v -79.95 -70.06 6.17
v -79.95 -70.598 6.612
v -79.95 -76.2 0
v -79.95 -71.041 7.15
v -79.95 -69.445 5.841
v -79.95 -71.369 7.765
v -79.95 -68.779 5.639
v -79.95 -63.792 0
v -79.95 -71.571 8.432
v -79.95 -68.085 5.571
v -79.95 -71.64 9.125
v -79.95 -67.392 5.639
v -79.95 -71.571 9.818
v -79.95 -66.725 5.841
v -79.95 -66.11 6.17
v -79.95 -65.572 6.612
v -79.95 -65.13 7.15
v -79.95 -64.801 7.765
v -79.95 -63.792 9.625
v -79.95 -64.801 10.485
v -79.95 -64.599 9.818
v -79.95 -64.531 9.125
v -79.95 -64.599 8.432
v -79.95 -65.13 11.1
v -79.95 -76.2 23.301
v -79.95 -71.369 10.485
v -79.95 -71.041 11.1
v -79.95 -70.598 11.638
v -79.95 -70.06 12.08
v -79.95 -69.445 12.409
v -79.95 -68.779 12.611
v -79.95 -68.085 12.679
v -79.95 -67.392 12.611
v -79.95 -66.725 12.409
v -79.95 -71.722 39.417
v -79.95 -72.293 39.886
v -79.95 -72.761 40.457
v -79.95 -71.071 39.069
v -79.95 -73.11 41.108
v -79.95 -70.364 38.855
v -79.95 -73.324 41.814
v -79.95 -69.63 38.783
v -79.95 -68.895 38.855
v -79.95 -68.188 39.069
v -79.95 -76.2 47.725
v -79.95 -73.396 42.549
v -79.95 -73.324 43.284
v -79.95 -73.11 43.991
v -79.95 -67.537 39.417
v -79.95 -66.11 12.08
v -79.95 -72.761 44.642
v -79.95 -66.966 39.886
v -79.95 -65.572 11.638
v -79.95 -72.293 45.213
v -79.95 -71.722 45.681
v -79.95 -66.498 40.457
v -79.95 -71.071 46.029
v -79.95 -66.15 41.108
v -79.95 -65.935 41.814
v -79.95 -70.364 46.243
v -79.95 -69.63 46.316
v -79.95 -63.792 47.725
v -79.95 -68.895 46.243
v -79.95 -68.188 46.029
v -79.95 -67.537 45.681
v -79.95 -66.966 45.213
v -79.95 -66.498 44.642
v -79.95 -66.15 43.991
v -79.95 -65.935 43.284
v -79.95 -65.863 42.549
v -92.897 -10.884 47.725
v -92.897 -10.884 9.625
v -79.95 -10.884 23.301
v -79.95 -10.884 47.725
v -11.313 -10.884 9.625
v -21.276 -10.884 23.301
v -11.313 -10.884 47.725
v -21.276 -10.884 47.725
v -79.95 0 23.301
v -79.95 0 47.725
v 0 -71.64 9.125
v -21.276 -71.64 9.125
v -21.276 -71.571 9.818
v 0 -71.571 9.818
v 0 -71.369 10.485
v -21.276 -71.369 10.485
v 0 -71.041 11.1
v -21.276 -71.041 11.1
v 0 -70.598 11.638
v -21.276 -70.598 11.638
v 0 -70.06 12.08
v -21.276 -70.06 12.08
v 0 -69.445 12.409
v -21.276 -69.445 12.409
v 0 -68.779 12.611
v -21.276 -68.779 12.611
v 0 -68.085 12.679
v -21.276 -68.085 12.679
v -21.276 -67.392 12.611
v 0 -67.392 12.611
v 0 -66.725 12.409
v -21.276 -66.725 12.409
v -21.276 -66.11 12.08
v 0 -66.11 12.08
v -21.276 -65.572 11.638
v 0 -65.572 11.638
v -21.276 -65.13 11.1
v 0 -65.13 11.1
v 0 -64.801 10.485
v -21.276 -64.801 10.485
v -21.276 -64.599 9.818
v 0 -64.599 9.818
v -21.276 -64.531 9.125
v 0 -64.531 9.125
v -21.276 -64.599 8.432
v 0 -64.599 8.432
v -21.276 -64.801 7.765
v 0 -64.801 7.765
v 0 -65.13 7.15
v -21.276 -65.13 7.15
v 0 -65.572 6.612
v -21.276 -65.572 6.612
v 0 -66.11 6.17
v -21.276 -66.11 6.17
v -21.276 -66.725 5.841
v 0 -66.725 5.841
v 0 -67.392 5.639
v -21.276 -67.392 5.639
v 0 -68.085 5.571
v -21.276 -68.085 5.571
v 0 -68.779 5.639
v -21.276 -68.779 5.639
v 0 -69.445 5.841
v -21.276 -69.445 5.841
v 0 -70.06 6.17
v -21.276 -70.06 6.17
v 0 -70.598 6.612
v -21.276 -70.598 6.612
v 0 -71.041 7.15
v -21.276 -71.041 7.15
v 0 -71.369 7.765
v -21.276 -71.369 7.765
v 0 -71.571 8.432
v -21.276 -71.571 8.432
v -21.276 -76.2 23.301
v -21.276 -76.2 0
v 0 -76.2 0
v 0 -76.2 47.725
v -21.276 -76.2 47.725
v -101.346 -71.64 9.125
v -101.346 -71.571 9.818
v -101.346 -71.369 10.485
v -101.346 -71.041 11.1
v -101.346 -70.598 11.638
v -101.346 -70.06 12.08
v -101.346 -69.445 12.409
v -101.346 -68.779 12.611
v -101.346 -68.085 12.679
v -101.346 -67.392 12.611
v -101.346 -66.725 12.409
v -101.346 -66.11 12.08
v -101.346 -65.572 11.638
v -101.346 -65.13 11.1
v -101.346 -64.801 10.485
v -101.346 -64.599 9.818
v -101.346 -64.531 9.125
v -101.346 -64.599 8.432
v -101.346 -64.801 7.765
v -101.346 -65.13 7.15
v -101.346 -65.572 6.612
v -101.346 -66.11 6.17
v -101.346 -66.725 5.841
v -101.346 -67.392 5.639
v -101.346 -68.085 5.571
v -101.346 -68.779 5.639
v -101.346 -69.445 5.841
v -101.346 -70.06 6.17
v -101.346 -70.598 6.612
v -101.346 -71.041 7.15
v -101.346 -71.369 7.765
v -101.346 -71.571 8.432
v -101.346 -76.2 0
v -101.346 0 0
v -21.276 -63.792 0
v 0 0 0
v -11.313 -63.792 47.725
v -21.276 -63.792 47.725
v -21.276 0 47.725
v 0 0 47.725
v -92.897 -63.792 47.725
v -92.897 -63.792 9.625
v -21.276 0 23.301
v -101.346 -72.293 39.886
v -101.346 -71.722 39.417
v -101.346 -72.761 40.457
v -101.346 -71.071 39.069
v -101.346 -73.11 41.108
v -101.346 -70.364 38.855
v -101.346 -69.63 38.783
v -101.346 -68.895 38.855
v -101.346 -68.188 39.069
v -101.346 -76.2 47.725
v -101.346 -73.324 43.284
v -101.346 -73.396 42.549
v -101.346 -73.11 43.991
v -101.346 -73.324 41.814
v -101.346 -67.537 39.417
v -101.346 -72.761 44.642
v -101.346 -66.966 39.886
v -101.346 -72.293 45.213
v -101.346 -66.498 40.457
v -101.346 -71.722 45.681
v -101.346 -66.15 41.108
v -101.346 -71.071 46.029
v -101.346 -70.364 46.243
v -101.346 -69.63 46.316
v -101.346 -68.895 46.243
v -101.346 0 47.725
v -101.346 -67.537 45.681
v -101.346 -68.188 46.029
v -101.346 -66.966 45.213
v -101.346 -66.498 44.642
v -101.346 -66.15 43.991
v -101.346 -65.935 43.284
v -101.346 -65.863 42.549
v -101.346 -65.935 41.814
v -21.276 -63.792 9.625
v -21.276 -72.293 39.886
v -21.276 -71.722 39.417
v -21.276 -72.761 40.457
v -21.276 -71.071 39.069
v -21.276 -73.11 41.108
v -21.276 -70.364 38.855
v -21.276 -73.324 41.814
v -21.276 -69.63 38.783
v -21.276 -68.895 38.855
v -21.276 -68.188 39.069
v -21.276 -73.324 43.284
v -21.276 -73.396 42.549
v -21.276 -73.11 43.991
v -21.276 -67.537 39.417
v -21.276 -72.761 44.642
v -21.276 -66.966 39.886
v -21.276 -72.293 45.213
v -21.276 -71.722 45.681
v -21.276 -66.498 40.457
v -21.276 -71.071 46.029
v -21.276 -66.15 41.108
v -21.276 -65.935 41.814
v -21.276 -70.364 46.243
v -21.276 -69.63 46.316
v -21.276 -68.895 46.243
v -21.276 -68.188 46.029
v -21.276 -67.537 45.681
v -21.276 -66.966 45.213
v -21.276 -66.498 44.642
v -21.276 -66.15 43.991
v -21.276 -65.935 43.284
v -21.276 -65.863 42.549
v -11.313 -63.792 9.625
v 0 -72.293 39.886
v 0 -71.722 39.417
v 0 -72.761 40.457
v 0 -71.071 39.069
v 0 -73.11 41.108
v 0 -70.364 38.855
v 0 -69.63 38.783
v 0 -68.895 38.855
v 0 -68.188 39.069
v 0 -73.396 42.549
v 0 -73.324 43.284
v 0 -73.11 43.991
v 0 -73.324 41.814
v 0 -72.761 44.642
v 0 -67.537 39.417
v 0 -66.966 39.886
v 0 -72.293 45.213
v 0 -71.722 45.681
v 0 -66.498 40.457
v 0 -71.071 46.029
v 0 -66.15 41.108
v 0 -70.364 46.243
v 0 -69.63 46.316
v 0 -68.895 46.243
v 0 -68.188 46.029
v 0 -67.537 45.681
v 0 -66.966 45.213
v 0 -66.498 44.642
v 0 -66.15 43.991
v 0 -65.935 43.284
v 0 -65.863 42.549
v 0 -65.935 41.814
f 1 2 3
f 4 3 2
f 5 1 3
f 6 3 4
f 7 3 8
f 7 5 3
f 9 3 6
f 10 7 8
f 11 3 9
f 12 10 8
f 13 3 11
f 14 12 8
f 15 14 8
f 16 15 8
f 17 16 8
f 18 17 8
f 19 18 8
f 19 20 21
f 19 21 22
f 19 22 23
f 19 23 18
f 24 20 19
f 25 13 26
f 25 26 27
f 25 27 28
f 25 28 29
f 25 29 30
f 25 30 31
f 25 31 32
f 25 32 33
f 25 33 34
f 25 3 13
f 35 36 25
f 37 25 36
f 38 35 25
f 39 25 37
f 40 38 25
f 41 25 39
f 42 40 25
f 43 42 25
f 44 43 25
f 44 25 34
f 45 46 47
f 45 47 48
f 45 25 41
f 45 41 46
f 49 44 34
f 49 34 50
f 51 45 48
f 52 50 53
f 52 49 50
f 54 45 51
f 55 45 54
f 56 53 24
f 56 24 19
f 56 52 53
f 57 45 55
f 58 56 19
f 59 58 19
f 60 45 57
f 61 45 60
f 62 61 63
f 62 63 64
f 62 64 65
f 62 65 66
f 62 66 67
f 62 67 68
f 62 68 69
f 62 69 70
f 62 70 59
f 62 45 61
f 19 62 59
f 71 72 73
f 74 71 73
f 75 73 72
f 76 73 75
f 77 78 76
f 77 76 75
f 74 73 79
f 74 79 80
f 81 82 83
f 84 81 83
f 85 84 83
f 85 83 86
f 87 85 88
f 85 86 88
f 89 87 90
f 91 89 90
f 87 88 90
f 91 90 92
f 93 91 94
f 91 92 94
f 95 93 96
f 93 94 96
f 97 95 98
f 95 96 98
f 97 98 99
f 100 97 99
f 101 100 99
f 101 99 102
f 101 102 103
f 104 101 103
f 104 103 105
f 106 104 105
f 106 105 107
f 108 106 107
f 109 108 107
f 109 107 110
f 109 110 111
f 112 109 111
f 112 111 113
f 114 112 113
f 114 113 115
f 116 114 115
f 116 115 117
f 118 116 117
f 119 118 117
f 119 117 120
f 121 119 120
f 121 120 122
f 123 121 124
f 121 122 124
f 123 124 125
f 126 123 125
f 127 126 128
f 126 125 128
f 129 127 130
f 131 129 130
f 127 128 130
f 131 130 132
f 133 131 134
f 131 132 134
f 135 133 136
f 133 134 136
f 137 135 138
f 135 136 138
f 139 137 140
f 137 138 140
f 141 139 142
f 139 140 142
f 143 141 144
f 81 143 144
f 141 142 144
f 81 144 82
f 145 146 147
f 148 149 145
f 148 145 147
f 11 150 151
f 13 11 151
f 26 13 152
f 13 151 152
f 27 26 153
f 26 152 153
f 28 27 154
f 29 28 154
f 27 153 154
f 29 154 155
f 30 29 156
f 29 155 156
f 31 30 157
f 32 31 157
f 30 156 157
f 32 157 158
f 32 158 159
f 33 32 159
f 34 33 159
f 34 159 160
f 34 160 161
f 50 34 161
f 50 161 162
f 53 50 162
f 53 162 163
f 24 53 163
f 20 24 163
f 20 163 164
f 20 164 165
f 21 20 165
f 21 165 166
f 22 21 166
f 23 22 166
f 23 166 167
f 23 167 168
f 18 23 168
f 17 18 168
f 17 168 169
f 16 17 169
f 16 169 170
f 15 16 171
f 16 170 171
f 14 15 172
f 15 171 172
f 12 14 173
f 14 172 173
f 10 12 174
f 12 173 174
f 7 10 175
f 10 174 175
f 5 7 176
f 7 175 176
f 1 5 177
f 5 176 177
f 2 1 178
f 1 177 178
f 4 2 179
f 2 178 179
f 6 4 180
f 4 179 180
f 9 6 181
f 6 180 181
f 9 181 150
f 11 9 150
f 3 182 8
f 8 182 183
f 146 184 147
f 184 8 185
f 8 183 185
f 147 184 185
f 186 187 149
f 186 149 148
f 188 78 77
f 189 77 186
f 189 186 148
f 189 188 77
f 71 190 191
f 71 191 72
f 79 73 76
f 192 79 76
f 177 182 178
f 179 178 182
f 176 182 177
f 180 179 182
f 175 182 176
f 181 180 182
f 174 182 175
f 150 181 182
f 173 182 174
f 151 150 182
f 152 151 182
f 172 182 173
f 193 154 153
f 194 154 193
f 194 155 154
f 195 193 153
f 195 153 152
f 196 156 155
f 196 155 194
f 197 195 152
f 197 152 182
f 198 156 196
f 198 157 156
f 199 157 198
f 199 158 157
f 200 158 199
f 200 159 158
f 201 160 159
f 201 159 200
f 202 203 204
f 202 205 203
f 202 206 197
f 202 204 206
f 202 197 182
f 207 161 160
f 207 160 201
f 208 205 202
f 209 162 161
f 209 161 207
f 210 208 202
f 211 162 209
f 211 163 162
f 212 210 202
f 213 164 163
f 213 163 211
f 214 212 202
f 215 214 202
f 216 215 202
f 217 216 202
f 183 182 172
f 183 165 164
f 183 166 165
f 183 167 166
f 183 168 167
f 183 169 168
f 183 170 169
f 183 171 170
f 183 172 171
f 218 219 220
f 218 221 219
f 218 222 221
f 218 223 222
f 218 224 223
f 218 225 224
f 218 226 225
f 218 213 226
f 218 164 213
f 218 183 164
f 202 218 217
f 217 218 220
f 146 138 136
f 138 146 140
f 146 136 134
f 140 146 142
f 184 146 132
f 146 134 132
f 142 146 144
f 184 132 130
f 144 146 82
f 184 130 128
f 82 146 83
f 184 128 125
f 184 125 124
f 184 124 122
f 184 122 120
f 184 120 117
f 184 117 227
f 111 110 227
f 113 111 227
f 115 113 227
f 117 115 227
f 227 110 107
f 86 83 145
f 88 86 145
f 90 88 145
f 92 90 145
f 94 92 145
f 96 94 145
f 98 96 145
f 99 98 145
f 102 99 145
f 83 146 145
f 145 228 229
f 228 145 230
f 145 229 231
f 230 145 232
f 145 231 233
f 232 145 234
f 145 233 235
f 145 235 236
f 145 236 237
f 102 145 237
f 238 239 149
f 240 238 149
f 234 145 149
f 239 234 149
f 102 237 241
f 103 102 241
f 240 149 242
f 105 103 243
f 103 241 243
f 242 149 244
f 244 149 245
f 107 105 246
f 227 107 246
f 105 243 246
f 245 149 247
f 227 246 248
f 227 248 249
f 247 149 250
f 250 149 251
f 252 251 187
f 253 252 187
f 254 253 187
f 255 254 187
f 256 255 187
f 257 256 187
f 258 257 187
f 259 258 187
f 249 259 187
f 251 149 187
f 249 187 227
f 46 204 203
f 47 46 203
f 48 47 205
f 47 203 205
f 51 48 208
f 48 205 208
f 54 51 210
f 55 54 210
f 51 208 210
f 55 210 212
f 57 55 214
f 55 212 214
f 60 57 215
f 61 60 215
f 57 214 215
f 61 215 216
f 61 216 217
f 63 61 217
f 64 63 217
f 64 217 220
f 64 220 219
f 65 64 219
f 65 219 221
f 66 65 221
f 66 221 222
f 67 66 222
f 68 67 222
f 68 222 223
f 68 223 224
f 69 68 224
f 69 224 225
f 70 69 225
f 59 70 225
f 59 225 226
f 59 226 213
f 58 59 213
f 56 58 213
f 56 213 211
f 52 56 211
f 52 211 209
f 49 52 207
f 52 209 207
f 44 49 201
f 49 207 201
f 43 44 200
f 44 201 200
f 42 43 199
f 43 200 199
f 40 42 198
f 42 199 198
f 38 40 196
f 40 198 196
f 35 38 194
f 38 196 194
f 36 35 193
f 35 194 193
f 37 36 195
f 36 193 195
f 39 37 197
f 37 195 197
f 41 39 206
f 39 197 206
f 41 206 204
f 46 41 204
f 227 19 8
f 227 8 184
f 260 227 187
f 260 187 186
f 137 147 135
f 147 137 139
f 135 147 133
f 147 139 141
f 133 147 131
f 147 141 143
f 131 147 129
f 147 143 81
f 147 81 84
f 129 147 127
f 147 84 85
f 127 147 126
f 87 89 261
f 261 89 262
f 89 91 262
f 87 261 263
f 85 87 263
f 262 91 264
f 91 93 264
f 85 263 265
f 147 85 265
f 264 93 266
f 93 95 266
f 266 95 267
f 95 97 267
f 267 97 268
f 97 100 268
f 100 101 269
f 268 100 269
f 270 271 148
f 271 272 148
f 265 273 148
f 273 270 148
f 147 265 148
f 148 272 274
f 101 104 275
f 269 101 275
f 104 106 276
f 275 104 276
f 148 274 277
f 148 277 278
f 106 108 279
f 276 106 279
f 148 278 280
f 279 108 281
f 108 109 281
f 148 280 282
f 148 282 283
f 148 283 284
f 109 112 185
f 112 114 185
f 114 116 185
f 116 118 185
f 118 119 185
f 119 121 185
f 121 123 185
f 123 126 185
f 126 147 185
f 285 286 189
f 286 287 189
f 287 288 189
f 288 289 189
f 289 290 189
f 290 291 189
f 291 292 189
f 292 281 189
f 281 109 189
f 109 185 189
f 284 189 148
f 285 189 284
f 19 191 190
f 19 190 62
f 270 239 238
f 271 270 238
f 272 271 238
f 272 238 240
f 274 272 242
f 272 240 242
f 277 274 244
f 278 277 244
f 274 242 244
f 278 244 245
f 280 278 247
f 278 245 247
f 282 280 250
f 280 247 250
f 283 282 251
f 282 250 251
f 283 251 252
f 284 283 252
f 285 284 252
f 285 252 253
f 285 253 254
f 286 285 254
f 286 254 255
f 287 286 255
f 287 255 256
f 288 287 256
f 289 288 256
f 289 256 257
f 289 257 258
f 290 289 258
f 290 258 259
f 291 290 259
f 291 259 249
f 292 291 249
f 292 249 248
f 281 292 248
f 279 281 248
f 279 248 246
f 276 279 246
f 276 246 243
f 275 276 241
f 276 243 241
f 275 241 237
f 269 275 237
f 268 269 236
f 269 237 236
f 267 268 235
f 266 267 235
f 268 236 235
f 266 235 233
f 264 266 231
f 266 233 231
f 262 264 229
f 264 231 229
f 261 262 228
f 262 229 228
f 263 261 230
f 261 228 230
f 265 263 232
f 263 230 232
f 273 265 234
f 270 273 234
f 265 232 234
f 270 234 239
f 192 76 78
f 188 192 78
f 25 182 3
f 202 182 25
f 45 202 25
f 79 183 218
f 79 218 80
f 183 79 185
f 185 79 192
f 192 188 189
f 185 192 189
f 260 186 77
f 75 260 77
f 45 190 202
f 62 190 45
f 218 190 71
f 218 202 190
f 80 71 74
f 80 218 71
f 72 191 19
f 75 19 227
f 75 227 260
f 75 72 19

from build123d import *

# Parameters (mm, degrees)
F0_W      = 101.346001029
F0_H      = 47.725263983
F1_DEPTH  = 76.2
F2_W      = 81.5831655636
F2_H      = 52.9085965827
F3_DEPTH  = 38.1
F4_W      = 58.673998341
F4_H      = 24.4241077453
F5_DEPTH  = 76.2
F6_W      = 58.673998341
F6_H      = 12.4078532577
F7_DEPTH  = 50.8
F8_R      = 3.5544652988
F9_DEPTH  = 127
F10_R     = 3.7666020305
F11_DEPTH = 127


with BuildPart() as f1:
    # F0 (on Front) → F1 (new body)
    with BuildSketch(Plane.XZ):
        with Locations((-50.6730005145, 23.8626319915)):
            Rectangle(F0_W, F0_H)
    extrude(amount=F1_DEPTH)

    # F2 (on face) → F3 (cut)
    with BuildSketch(Plane.XY.offset(47.725263983)):
        with Locations((-52.104968112, -37.337848451)):
            Rectangle(F2_W, F2_H)
    extrude(amount=-F3_DEPTH, mode=Mode.SUBTRACT)

    # F4 (on face) → F5 (cut)
    with BuildSketch(Plane.XZ.offset(76.2)):
        with Locations((-50.6128417328, 35.5132101104)):
            Rectangle(F4_W, F4_H)
    extrude(amount=-F5_DEPTH, mode=Mode.SUBTRACT)

    # F6 (on face) → F7 (cut)
    with BuildSketch(Plane.XY.offset(23.3011562377)):
        with Locations((-50.6128417328, -69.9960733712)):
            Rectangle(F6_W, F6_H)
    extrude(amount=-F7_DEPTH, mode=Mode.SUBTRACT)

    # F8 (on face) → F9 (cut)
    with BuildSketch(Plane(origin=(-101.346001029, 0, 0), x_dir=(0, -1, 0), z_dir=(-1, 0, 0))):
        with Locations((68.0850967765, 9.1249775141)):
            Circle(F8_R)
    extrude(amount=-F9_DEPTH, mode=Mode.SUBTRACT)

    # F10 (on face) → F11 (cut)
    with BuildSketch(Plane(origin=(-101.346001029, 0, 0), x_dir=(0, -1, 0), z_dir=(-1, 0, 0))):
        with Locations((69.6296393871, 42.5492078066)):
            Circle(F10_R)
    extrude(amount=-F11_DEPTH, mode=Mode.SUBTRACT)


solid = f1.part
